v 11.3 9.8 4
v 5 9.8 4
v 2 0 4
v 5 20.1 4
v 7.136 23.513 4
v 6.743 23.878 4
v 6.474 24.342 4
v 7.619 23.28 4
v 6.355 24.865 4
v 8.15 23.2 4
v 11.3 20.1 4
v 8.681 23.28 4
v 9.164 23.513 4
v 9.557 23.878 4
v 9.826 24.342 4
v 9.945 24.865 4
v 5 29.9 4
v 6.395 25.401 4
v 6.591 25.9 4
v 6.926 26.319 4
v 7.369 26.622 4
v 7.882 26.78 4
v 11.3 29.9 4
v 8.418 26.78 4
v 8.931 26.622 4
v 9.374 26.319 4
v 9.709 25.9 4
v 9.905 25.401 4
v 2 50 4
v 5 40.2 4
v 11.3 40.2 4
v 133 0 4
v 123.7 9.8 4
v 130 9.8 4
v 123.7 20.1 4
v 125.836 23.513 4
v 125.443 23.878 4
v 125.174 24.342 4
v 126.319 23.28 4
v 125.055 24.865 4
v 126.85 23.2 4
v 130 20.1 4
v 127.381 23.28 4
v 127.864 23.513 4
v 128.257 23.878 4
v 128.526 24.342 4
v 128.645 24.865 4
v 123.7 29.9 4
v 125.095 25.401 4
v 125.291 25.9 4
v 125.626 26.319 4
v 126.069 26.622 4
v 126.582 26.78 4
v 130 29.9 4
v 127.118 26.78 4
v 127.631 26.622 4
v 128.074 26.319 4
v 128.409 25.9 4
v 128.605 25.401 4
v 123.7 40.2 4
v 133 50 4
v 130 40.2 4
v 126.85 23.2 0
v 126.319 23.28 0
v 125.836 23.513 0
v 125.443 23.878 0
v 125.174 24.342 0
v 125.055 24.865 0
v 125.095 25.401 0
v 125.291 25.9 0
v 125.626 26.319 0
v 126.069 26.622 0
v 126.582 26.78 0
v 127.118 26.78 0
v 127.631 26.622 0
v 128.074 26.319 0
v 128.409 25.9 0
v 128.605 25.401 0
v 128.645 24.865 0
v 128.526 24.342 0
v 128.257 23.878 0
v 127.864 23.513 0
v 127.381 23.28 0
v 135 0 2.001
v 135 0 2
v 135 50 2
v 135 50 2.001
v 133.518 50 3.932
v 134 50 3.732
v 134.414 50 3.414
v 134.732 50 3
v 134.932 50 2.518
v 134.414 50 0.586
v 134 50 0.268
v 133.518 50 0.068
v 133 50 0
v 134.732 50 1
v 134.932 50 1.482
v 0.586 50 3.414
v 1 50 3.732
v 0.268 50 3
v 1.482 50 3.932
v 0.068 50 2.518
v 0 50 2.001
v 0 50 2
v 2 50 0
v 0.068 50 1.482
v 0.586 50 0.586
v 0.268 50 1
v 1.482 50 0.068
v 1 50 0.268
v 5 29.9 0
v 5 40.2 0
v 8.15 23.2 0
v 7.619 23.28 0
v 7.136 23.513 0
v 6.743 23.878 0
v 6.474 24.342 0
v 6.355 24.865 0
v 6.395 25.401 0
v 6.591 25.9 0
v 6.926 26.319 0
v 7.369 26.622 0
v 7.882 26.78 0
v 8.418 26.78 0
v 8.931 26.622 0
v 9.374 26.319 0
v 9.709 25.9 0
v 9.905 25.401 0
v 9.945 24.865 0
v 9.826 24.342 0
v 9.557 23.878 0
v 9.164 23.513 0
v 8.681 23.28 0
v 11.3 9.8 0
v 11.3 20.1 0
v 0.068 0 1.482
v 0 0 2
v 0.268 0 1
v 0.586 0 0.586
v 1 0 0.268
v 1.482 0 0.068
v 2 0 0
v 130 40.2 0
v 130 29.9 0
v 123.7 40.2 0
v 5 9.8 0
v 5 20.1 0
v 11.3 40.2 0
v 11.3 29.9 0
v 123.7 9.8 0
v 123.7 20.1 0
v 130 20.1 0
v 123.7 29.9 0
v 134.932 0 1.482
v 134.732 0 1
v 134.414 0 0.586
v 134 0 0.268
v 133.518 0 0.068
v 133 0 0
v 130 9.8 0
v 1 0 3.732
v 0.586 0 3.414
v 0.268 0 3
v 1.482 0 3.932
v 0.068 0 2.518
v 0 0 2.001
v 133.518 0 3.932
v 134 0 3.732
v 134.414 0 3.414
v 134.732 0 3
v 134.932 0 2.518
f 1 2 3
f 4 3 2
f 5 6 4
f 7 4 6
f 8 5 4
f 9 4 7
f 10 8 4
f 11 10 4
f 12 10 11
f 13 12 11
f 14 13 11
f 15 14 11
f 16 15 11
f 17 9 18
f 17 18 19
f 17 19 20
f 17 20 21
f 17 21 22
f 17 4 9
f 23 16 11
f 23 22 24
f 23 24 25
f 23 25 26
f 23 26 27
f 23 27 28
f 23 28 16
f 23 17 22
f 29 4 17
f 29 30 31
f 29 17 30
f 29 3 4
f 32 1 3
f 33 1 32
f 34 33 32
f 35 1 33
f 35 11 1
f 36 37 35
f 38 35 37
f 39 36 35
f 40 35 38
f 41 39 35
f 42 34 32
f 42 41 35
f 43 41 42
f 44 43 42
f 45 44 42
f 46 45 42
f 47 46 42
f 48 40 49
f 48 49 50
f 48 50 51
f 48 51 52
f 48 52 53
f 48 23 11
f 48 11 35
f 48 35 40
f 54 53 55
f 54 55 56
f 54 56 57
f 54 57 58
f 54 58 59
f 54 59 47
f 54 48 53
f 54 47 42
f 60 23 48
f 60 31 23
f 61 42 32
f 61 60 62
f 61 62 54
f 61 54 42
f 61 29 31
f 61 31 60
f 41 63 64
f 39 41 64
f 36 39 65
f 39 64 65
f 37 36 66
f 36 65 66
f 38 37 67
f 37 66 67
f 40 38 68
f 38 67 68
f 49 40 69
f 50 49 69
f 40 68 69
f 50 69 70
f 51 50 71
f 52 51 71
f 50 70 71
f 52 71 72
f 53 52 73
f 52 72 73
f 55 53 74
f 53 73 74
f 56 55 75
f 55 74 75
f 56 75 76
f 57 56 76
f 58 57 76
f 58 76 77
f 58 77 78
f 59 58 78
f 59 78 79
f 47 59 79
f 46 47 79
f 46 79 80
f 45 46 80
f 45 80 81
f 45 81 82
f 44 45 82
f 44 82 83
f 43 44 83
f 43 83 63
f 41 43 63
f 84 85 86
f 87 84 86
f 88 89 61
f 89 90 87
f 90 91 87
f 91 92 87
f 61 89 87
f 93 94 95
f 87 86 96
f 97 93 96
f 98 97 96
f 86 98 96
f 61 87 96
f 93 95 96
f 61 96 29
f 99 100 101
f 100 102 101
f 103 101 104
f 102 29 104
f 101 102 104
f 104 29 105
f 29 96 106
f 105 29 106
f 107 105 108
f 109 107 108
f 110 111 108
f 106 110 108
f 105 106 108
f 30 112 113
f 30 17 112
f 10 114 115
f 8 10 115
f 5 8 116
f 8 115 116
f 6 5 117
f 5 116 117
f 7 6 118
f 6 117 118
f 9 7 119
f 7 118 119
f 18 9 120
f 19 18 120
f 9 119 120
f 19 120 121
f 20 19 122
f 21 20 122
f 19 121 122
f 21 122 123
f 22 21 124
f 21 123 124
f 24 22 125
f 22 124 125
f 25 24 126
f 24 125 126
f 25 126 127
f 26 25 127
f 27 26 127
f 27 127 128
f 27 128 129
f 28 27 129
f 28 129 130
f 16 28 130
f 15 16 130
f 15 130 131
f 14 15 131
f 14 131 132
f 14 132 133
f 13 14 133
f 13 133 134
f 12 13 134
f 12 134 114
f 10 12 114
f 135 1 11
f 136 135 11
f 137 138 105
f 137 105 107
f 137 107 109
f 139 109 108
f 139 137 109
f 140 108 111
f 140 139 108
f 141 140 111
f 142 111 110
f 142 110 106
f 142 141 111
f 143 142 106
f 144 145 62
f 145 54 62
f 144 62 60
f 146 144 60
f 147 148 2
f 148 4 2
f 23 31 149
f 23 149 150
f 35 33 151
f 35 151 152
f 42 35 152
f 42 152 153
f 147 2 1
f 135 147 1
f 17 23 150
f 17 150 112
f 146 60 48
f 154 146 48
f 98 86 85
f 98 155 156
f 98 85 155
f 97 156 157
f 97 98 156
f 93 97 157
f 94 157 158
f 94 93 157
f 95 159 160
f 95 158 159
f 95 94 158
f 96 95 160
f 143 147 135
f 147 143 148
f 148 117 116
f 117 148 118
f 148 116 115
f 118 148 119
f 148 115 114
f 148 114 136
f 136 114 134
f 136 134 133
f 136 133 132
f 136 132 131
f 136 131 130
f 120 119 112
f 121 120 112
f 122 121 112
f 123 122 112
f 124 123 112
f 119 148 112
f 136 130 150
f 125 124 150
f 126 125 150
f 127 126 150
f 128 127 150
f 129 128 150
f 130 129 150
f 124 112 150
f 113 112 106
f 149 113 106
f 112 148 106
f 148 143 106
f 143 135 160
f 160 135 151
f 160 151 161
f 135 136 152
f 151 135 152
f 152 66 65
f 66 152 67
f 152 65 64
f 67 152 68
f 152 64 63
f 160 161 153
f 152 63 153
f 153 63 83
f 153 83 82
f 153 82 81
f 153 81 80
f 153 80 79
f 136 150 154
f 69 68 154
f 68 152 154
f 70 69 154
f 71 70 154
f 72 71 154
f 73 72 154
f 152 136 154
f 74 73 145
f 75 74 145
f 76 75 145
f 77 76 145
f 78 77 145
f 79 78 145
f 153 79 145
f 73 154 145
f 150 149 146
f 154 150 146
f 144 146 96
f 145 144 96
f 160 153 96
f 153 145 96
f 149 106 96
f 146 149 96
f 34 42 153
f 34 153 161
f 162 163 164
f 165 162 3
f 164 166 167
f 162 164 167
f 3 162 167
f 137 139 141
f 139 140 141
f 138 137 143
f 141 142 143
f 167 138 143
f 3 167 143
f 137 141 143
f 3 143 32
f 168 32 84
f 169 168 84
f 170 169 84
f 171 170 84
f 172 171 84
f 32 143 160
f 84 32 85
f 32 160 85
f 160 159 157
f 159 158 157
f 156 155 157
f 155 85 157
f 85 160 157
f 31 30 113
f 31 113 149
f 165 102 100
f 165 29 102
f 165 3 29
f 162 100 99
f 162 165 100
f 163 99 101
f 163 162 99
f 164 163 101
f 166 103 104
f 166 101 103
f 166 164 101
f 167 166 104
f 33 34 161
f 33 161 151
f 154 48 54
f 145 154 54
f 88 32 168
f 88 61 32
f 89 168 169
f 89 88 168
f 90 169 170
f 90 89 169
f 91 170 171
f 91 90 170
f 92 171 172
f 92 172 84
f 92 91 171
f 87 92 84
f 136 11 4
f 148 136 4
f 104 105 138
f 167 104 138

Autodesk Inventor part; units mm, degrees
ref_plane "YZ Plane" through (0, 0, 0) normal (1, 0, 0) x (0, 1, 0)
ref_plane "XZ Plane" through (0, 0, 0) normal (0, 1, 0) x (-1, 0, 0)
ref_plane "XY Plane" through (0, 0, 0) normal (0, 0, 1) x (1, 0, 0)
sketch "スケッチ1" plane through (0, 0, 0) normal (0, 0, 1) x (1, 0, 0)
  line L0 (0, 0) -> (135, 0)
  line L1 (135, 0) -> (135, 50)
  line L2 (135, 50) -> (0, 50)
  line L3 (0, 50) -> (0, 0)
  dimension "d0" = 135
  dimension "d1" = 50
extrude "押し出し1" add sketch "スケッチ1" along normal blind 4
sketch "スケッチ2" plane through (0, 0, 4) normal (0, 0, 1) x (1, 0, 0)
  line L0 (5, 40.2) -> (11.3, 40.2)
  line L1 (11.3, 40.2) -> (11.3, 29.9)
  line L2 (11.3, 29.9) -> (5, 29.9)
  line L3 (5, 29.9) -> (5, 40.2)
  line L4 (135, 50) -> (0, 50) projected
  line L5 (0, 50) -> (0, 0) projected
  line L6 (0, 25) -> (135, 25)
  line L7 (135, 0) -> (135, 50) projected
  line L8 (67.5, 50) -> (67.5, 0)
  line L9 (0, 0) -> (135, 0) projected
  line L10 (5, 9.8) -> (11.3, 9.8)
  line L11 (11.3, 9.8) -> (11.3, 20.1)
  line L12 (11.3, 20.1) -> (5, 20.1)
  line L13 (5, 20.1) -> (5, 9.8)
  line L14 (130, 40.2) -> (123.7, 40.2)
  line L15 (123.7, 40.2) -> (123.7, 29.9)
  line L16 (123.7, 29.9) -> (130, 29.9)
  line L17 (130, 29.9) -> (130, 40.2)
  line L18 (135, 25) -> (0, 25)
  line L19 (130, 9.8) -> (123.7, 9.8)
  line L20 (123.7, 9.8) -> (123.7, 20.1)
  line L21 (123.7, 20.1) -> (130, 20.1)
  line L22 (130, 20.1) -> (130, 9.8)
  dimension "d4" = 6.3
  dimension "d5" = 10.3
  dimension "d6" = 9.8
  dimension "d7" = 5
extrude "押し出し2" cut sketch "スケッチ2" against normal blind 10 contours L0 L1 L2 L3 | L13 L12 L11 L10 | L17 L16 L15 L14 | L19 L20 L21 L22
sketch "スケッチ3" plane through (0, 0, 4) normal (0, 0, 1) x (1, 0, 0)
  line L0 (11.3, 29.9) -> (5, 29.9) projected
  line L1 (0, 50) -> (0, 0) projected
  line L2 (135, 50) -> (0, 50) projected
  line L3 (67.5, 50) -> (67.5, 0)
  line L4 (0, 0) -> (135, 0) projected
  point P0 (8.15, 25)
  point P1 (126.85, 25)
  dimension "d10" = 4.9
  dimension "d11" = 8.15
hole "穴1" at (8.15, 25, 4) at (126.85, 25, 4) direction (0, 0, -1) diameter 3.6 depth 4.5
fillet "フィレット1" radius 2 4 edges at (0, 25, 4) (0, 25, 0) (135, 25, 4) (135, 25, 0)
properties part number "menteB"
